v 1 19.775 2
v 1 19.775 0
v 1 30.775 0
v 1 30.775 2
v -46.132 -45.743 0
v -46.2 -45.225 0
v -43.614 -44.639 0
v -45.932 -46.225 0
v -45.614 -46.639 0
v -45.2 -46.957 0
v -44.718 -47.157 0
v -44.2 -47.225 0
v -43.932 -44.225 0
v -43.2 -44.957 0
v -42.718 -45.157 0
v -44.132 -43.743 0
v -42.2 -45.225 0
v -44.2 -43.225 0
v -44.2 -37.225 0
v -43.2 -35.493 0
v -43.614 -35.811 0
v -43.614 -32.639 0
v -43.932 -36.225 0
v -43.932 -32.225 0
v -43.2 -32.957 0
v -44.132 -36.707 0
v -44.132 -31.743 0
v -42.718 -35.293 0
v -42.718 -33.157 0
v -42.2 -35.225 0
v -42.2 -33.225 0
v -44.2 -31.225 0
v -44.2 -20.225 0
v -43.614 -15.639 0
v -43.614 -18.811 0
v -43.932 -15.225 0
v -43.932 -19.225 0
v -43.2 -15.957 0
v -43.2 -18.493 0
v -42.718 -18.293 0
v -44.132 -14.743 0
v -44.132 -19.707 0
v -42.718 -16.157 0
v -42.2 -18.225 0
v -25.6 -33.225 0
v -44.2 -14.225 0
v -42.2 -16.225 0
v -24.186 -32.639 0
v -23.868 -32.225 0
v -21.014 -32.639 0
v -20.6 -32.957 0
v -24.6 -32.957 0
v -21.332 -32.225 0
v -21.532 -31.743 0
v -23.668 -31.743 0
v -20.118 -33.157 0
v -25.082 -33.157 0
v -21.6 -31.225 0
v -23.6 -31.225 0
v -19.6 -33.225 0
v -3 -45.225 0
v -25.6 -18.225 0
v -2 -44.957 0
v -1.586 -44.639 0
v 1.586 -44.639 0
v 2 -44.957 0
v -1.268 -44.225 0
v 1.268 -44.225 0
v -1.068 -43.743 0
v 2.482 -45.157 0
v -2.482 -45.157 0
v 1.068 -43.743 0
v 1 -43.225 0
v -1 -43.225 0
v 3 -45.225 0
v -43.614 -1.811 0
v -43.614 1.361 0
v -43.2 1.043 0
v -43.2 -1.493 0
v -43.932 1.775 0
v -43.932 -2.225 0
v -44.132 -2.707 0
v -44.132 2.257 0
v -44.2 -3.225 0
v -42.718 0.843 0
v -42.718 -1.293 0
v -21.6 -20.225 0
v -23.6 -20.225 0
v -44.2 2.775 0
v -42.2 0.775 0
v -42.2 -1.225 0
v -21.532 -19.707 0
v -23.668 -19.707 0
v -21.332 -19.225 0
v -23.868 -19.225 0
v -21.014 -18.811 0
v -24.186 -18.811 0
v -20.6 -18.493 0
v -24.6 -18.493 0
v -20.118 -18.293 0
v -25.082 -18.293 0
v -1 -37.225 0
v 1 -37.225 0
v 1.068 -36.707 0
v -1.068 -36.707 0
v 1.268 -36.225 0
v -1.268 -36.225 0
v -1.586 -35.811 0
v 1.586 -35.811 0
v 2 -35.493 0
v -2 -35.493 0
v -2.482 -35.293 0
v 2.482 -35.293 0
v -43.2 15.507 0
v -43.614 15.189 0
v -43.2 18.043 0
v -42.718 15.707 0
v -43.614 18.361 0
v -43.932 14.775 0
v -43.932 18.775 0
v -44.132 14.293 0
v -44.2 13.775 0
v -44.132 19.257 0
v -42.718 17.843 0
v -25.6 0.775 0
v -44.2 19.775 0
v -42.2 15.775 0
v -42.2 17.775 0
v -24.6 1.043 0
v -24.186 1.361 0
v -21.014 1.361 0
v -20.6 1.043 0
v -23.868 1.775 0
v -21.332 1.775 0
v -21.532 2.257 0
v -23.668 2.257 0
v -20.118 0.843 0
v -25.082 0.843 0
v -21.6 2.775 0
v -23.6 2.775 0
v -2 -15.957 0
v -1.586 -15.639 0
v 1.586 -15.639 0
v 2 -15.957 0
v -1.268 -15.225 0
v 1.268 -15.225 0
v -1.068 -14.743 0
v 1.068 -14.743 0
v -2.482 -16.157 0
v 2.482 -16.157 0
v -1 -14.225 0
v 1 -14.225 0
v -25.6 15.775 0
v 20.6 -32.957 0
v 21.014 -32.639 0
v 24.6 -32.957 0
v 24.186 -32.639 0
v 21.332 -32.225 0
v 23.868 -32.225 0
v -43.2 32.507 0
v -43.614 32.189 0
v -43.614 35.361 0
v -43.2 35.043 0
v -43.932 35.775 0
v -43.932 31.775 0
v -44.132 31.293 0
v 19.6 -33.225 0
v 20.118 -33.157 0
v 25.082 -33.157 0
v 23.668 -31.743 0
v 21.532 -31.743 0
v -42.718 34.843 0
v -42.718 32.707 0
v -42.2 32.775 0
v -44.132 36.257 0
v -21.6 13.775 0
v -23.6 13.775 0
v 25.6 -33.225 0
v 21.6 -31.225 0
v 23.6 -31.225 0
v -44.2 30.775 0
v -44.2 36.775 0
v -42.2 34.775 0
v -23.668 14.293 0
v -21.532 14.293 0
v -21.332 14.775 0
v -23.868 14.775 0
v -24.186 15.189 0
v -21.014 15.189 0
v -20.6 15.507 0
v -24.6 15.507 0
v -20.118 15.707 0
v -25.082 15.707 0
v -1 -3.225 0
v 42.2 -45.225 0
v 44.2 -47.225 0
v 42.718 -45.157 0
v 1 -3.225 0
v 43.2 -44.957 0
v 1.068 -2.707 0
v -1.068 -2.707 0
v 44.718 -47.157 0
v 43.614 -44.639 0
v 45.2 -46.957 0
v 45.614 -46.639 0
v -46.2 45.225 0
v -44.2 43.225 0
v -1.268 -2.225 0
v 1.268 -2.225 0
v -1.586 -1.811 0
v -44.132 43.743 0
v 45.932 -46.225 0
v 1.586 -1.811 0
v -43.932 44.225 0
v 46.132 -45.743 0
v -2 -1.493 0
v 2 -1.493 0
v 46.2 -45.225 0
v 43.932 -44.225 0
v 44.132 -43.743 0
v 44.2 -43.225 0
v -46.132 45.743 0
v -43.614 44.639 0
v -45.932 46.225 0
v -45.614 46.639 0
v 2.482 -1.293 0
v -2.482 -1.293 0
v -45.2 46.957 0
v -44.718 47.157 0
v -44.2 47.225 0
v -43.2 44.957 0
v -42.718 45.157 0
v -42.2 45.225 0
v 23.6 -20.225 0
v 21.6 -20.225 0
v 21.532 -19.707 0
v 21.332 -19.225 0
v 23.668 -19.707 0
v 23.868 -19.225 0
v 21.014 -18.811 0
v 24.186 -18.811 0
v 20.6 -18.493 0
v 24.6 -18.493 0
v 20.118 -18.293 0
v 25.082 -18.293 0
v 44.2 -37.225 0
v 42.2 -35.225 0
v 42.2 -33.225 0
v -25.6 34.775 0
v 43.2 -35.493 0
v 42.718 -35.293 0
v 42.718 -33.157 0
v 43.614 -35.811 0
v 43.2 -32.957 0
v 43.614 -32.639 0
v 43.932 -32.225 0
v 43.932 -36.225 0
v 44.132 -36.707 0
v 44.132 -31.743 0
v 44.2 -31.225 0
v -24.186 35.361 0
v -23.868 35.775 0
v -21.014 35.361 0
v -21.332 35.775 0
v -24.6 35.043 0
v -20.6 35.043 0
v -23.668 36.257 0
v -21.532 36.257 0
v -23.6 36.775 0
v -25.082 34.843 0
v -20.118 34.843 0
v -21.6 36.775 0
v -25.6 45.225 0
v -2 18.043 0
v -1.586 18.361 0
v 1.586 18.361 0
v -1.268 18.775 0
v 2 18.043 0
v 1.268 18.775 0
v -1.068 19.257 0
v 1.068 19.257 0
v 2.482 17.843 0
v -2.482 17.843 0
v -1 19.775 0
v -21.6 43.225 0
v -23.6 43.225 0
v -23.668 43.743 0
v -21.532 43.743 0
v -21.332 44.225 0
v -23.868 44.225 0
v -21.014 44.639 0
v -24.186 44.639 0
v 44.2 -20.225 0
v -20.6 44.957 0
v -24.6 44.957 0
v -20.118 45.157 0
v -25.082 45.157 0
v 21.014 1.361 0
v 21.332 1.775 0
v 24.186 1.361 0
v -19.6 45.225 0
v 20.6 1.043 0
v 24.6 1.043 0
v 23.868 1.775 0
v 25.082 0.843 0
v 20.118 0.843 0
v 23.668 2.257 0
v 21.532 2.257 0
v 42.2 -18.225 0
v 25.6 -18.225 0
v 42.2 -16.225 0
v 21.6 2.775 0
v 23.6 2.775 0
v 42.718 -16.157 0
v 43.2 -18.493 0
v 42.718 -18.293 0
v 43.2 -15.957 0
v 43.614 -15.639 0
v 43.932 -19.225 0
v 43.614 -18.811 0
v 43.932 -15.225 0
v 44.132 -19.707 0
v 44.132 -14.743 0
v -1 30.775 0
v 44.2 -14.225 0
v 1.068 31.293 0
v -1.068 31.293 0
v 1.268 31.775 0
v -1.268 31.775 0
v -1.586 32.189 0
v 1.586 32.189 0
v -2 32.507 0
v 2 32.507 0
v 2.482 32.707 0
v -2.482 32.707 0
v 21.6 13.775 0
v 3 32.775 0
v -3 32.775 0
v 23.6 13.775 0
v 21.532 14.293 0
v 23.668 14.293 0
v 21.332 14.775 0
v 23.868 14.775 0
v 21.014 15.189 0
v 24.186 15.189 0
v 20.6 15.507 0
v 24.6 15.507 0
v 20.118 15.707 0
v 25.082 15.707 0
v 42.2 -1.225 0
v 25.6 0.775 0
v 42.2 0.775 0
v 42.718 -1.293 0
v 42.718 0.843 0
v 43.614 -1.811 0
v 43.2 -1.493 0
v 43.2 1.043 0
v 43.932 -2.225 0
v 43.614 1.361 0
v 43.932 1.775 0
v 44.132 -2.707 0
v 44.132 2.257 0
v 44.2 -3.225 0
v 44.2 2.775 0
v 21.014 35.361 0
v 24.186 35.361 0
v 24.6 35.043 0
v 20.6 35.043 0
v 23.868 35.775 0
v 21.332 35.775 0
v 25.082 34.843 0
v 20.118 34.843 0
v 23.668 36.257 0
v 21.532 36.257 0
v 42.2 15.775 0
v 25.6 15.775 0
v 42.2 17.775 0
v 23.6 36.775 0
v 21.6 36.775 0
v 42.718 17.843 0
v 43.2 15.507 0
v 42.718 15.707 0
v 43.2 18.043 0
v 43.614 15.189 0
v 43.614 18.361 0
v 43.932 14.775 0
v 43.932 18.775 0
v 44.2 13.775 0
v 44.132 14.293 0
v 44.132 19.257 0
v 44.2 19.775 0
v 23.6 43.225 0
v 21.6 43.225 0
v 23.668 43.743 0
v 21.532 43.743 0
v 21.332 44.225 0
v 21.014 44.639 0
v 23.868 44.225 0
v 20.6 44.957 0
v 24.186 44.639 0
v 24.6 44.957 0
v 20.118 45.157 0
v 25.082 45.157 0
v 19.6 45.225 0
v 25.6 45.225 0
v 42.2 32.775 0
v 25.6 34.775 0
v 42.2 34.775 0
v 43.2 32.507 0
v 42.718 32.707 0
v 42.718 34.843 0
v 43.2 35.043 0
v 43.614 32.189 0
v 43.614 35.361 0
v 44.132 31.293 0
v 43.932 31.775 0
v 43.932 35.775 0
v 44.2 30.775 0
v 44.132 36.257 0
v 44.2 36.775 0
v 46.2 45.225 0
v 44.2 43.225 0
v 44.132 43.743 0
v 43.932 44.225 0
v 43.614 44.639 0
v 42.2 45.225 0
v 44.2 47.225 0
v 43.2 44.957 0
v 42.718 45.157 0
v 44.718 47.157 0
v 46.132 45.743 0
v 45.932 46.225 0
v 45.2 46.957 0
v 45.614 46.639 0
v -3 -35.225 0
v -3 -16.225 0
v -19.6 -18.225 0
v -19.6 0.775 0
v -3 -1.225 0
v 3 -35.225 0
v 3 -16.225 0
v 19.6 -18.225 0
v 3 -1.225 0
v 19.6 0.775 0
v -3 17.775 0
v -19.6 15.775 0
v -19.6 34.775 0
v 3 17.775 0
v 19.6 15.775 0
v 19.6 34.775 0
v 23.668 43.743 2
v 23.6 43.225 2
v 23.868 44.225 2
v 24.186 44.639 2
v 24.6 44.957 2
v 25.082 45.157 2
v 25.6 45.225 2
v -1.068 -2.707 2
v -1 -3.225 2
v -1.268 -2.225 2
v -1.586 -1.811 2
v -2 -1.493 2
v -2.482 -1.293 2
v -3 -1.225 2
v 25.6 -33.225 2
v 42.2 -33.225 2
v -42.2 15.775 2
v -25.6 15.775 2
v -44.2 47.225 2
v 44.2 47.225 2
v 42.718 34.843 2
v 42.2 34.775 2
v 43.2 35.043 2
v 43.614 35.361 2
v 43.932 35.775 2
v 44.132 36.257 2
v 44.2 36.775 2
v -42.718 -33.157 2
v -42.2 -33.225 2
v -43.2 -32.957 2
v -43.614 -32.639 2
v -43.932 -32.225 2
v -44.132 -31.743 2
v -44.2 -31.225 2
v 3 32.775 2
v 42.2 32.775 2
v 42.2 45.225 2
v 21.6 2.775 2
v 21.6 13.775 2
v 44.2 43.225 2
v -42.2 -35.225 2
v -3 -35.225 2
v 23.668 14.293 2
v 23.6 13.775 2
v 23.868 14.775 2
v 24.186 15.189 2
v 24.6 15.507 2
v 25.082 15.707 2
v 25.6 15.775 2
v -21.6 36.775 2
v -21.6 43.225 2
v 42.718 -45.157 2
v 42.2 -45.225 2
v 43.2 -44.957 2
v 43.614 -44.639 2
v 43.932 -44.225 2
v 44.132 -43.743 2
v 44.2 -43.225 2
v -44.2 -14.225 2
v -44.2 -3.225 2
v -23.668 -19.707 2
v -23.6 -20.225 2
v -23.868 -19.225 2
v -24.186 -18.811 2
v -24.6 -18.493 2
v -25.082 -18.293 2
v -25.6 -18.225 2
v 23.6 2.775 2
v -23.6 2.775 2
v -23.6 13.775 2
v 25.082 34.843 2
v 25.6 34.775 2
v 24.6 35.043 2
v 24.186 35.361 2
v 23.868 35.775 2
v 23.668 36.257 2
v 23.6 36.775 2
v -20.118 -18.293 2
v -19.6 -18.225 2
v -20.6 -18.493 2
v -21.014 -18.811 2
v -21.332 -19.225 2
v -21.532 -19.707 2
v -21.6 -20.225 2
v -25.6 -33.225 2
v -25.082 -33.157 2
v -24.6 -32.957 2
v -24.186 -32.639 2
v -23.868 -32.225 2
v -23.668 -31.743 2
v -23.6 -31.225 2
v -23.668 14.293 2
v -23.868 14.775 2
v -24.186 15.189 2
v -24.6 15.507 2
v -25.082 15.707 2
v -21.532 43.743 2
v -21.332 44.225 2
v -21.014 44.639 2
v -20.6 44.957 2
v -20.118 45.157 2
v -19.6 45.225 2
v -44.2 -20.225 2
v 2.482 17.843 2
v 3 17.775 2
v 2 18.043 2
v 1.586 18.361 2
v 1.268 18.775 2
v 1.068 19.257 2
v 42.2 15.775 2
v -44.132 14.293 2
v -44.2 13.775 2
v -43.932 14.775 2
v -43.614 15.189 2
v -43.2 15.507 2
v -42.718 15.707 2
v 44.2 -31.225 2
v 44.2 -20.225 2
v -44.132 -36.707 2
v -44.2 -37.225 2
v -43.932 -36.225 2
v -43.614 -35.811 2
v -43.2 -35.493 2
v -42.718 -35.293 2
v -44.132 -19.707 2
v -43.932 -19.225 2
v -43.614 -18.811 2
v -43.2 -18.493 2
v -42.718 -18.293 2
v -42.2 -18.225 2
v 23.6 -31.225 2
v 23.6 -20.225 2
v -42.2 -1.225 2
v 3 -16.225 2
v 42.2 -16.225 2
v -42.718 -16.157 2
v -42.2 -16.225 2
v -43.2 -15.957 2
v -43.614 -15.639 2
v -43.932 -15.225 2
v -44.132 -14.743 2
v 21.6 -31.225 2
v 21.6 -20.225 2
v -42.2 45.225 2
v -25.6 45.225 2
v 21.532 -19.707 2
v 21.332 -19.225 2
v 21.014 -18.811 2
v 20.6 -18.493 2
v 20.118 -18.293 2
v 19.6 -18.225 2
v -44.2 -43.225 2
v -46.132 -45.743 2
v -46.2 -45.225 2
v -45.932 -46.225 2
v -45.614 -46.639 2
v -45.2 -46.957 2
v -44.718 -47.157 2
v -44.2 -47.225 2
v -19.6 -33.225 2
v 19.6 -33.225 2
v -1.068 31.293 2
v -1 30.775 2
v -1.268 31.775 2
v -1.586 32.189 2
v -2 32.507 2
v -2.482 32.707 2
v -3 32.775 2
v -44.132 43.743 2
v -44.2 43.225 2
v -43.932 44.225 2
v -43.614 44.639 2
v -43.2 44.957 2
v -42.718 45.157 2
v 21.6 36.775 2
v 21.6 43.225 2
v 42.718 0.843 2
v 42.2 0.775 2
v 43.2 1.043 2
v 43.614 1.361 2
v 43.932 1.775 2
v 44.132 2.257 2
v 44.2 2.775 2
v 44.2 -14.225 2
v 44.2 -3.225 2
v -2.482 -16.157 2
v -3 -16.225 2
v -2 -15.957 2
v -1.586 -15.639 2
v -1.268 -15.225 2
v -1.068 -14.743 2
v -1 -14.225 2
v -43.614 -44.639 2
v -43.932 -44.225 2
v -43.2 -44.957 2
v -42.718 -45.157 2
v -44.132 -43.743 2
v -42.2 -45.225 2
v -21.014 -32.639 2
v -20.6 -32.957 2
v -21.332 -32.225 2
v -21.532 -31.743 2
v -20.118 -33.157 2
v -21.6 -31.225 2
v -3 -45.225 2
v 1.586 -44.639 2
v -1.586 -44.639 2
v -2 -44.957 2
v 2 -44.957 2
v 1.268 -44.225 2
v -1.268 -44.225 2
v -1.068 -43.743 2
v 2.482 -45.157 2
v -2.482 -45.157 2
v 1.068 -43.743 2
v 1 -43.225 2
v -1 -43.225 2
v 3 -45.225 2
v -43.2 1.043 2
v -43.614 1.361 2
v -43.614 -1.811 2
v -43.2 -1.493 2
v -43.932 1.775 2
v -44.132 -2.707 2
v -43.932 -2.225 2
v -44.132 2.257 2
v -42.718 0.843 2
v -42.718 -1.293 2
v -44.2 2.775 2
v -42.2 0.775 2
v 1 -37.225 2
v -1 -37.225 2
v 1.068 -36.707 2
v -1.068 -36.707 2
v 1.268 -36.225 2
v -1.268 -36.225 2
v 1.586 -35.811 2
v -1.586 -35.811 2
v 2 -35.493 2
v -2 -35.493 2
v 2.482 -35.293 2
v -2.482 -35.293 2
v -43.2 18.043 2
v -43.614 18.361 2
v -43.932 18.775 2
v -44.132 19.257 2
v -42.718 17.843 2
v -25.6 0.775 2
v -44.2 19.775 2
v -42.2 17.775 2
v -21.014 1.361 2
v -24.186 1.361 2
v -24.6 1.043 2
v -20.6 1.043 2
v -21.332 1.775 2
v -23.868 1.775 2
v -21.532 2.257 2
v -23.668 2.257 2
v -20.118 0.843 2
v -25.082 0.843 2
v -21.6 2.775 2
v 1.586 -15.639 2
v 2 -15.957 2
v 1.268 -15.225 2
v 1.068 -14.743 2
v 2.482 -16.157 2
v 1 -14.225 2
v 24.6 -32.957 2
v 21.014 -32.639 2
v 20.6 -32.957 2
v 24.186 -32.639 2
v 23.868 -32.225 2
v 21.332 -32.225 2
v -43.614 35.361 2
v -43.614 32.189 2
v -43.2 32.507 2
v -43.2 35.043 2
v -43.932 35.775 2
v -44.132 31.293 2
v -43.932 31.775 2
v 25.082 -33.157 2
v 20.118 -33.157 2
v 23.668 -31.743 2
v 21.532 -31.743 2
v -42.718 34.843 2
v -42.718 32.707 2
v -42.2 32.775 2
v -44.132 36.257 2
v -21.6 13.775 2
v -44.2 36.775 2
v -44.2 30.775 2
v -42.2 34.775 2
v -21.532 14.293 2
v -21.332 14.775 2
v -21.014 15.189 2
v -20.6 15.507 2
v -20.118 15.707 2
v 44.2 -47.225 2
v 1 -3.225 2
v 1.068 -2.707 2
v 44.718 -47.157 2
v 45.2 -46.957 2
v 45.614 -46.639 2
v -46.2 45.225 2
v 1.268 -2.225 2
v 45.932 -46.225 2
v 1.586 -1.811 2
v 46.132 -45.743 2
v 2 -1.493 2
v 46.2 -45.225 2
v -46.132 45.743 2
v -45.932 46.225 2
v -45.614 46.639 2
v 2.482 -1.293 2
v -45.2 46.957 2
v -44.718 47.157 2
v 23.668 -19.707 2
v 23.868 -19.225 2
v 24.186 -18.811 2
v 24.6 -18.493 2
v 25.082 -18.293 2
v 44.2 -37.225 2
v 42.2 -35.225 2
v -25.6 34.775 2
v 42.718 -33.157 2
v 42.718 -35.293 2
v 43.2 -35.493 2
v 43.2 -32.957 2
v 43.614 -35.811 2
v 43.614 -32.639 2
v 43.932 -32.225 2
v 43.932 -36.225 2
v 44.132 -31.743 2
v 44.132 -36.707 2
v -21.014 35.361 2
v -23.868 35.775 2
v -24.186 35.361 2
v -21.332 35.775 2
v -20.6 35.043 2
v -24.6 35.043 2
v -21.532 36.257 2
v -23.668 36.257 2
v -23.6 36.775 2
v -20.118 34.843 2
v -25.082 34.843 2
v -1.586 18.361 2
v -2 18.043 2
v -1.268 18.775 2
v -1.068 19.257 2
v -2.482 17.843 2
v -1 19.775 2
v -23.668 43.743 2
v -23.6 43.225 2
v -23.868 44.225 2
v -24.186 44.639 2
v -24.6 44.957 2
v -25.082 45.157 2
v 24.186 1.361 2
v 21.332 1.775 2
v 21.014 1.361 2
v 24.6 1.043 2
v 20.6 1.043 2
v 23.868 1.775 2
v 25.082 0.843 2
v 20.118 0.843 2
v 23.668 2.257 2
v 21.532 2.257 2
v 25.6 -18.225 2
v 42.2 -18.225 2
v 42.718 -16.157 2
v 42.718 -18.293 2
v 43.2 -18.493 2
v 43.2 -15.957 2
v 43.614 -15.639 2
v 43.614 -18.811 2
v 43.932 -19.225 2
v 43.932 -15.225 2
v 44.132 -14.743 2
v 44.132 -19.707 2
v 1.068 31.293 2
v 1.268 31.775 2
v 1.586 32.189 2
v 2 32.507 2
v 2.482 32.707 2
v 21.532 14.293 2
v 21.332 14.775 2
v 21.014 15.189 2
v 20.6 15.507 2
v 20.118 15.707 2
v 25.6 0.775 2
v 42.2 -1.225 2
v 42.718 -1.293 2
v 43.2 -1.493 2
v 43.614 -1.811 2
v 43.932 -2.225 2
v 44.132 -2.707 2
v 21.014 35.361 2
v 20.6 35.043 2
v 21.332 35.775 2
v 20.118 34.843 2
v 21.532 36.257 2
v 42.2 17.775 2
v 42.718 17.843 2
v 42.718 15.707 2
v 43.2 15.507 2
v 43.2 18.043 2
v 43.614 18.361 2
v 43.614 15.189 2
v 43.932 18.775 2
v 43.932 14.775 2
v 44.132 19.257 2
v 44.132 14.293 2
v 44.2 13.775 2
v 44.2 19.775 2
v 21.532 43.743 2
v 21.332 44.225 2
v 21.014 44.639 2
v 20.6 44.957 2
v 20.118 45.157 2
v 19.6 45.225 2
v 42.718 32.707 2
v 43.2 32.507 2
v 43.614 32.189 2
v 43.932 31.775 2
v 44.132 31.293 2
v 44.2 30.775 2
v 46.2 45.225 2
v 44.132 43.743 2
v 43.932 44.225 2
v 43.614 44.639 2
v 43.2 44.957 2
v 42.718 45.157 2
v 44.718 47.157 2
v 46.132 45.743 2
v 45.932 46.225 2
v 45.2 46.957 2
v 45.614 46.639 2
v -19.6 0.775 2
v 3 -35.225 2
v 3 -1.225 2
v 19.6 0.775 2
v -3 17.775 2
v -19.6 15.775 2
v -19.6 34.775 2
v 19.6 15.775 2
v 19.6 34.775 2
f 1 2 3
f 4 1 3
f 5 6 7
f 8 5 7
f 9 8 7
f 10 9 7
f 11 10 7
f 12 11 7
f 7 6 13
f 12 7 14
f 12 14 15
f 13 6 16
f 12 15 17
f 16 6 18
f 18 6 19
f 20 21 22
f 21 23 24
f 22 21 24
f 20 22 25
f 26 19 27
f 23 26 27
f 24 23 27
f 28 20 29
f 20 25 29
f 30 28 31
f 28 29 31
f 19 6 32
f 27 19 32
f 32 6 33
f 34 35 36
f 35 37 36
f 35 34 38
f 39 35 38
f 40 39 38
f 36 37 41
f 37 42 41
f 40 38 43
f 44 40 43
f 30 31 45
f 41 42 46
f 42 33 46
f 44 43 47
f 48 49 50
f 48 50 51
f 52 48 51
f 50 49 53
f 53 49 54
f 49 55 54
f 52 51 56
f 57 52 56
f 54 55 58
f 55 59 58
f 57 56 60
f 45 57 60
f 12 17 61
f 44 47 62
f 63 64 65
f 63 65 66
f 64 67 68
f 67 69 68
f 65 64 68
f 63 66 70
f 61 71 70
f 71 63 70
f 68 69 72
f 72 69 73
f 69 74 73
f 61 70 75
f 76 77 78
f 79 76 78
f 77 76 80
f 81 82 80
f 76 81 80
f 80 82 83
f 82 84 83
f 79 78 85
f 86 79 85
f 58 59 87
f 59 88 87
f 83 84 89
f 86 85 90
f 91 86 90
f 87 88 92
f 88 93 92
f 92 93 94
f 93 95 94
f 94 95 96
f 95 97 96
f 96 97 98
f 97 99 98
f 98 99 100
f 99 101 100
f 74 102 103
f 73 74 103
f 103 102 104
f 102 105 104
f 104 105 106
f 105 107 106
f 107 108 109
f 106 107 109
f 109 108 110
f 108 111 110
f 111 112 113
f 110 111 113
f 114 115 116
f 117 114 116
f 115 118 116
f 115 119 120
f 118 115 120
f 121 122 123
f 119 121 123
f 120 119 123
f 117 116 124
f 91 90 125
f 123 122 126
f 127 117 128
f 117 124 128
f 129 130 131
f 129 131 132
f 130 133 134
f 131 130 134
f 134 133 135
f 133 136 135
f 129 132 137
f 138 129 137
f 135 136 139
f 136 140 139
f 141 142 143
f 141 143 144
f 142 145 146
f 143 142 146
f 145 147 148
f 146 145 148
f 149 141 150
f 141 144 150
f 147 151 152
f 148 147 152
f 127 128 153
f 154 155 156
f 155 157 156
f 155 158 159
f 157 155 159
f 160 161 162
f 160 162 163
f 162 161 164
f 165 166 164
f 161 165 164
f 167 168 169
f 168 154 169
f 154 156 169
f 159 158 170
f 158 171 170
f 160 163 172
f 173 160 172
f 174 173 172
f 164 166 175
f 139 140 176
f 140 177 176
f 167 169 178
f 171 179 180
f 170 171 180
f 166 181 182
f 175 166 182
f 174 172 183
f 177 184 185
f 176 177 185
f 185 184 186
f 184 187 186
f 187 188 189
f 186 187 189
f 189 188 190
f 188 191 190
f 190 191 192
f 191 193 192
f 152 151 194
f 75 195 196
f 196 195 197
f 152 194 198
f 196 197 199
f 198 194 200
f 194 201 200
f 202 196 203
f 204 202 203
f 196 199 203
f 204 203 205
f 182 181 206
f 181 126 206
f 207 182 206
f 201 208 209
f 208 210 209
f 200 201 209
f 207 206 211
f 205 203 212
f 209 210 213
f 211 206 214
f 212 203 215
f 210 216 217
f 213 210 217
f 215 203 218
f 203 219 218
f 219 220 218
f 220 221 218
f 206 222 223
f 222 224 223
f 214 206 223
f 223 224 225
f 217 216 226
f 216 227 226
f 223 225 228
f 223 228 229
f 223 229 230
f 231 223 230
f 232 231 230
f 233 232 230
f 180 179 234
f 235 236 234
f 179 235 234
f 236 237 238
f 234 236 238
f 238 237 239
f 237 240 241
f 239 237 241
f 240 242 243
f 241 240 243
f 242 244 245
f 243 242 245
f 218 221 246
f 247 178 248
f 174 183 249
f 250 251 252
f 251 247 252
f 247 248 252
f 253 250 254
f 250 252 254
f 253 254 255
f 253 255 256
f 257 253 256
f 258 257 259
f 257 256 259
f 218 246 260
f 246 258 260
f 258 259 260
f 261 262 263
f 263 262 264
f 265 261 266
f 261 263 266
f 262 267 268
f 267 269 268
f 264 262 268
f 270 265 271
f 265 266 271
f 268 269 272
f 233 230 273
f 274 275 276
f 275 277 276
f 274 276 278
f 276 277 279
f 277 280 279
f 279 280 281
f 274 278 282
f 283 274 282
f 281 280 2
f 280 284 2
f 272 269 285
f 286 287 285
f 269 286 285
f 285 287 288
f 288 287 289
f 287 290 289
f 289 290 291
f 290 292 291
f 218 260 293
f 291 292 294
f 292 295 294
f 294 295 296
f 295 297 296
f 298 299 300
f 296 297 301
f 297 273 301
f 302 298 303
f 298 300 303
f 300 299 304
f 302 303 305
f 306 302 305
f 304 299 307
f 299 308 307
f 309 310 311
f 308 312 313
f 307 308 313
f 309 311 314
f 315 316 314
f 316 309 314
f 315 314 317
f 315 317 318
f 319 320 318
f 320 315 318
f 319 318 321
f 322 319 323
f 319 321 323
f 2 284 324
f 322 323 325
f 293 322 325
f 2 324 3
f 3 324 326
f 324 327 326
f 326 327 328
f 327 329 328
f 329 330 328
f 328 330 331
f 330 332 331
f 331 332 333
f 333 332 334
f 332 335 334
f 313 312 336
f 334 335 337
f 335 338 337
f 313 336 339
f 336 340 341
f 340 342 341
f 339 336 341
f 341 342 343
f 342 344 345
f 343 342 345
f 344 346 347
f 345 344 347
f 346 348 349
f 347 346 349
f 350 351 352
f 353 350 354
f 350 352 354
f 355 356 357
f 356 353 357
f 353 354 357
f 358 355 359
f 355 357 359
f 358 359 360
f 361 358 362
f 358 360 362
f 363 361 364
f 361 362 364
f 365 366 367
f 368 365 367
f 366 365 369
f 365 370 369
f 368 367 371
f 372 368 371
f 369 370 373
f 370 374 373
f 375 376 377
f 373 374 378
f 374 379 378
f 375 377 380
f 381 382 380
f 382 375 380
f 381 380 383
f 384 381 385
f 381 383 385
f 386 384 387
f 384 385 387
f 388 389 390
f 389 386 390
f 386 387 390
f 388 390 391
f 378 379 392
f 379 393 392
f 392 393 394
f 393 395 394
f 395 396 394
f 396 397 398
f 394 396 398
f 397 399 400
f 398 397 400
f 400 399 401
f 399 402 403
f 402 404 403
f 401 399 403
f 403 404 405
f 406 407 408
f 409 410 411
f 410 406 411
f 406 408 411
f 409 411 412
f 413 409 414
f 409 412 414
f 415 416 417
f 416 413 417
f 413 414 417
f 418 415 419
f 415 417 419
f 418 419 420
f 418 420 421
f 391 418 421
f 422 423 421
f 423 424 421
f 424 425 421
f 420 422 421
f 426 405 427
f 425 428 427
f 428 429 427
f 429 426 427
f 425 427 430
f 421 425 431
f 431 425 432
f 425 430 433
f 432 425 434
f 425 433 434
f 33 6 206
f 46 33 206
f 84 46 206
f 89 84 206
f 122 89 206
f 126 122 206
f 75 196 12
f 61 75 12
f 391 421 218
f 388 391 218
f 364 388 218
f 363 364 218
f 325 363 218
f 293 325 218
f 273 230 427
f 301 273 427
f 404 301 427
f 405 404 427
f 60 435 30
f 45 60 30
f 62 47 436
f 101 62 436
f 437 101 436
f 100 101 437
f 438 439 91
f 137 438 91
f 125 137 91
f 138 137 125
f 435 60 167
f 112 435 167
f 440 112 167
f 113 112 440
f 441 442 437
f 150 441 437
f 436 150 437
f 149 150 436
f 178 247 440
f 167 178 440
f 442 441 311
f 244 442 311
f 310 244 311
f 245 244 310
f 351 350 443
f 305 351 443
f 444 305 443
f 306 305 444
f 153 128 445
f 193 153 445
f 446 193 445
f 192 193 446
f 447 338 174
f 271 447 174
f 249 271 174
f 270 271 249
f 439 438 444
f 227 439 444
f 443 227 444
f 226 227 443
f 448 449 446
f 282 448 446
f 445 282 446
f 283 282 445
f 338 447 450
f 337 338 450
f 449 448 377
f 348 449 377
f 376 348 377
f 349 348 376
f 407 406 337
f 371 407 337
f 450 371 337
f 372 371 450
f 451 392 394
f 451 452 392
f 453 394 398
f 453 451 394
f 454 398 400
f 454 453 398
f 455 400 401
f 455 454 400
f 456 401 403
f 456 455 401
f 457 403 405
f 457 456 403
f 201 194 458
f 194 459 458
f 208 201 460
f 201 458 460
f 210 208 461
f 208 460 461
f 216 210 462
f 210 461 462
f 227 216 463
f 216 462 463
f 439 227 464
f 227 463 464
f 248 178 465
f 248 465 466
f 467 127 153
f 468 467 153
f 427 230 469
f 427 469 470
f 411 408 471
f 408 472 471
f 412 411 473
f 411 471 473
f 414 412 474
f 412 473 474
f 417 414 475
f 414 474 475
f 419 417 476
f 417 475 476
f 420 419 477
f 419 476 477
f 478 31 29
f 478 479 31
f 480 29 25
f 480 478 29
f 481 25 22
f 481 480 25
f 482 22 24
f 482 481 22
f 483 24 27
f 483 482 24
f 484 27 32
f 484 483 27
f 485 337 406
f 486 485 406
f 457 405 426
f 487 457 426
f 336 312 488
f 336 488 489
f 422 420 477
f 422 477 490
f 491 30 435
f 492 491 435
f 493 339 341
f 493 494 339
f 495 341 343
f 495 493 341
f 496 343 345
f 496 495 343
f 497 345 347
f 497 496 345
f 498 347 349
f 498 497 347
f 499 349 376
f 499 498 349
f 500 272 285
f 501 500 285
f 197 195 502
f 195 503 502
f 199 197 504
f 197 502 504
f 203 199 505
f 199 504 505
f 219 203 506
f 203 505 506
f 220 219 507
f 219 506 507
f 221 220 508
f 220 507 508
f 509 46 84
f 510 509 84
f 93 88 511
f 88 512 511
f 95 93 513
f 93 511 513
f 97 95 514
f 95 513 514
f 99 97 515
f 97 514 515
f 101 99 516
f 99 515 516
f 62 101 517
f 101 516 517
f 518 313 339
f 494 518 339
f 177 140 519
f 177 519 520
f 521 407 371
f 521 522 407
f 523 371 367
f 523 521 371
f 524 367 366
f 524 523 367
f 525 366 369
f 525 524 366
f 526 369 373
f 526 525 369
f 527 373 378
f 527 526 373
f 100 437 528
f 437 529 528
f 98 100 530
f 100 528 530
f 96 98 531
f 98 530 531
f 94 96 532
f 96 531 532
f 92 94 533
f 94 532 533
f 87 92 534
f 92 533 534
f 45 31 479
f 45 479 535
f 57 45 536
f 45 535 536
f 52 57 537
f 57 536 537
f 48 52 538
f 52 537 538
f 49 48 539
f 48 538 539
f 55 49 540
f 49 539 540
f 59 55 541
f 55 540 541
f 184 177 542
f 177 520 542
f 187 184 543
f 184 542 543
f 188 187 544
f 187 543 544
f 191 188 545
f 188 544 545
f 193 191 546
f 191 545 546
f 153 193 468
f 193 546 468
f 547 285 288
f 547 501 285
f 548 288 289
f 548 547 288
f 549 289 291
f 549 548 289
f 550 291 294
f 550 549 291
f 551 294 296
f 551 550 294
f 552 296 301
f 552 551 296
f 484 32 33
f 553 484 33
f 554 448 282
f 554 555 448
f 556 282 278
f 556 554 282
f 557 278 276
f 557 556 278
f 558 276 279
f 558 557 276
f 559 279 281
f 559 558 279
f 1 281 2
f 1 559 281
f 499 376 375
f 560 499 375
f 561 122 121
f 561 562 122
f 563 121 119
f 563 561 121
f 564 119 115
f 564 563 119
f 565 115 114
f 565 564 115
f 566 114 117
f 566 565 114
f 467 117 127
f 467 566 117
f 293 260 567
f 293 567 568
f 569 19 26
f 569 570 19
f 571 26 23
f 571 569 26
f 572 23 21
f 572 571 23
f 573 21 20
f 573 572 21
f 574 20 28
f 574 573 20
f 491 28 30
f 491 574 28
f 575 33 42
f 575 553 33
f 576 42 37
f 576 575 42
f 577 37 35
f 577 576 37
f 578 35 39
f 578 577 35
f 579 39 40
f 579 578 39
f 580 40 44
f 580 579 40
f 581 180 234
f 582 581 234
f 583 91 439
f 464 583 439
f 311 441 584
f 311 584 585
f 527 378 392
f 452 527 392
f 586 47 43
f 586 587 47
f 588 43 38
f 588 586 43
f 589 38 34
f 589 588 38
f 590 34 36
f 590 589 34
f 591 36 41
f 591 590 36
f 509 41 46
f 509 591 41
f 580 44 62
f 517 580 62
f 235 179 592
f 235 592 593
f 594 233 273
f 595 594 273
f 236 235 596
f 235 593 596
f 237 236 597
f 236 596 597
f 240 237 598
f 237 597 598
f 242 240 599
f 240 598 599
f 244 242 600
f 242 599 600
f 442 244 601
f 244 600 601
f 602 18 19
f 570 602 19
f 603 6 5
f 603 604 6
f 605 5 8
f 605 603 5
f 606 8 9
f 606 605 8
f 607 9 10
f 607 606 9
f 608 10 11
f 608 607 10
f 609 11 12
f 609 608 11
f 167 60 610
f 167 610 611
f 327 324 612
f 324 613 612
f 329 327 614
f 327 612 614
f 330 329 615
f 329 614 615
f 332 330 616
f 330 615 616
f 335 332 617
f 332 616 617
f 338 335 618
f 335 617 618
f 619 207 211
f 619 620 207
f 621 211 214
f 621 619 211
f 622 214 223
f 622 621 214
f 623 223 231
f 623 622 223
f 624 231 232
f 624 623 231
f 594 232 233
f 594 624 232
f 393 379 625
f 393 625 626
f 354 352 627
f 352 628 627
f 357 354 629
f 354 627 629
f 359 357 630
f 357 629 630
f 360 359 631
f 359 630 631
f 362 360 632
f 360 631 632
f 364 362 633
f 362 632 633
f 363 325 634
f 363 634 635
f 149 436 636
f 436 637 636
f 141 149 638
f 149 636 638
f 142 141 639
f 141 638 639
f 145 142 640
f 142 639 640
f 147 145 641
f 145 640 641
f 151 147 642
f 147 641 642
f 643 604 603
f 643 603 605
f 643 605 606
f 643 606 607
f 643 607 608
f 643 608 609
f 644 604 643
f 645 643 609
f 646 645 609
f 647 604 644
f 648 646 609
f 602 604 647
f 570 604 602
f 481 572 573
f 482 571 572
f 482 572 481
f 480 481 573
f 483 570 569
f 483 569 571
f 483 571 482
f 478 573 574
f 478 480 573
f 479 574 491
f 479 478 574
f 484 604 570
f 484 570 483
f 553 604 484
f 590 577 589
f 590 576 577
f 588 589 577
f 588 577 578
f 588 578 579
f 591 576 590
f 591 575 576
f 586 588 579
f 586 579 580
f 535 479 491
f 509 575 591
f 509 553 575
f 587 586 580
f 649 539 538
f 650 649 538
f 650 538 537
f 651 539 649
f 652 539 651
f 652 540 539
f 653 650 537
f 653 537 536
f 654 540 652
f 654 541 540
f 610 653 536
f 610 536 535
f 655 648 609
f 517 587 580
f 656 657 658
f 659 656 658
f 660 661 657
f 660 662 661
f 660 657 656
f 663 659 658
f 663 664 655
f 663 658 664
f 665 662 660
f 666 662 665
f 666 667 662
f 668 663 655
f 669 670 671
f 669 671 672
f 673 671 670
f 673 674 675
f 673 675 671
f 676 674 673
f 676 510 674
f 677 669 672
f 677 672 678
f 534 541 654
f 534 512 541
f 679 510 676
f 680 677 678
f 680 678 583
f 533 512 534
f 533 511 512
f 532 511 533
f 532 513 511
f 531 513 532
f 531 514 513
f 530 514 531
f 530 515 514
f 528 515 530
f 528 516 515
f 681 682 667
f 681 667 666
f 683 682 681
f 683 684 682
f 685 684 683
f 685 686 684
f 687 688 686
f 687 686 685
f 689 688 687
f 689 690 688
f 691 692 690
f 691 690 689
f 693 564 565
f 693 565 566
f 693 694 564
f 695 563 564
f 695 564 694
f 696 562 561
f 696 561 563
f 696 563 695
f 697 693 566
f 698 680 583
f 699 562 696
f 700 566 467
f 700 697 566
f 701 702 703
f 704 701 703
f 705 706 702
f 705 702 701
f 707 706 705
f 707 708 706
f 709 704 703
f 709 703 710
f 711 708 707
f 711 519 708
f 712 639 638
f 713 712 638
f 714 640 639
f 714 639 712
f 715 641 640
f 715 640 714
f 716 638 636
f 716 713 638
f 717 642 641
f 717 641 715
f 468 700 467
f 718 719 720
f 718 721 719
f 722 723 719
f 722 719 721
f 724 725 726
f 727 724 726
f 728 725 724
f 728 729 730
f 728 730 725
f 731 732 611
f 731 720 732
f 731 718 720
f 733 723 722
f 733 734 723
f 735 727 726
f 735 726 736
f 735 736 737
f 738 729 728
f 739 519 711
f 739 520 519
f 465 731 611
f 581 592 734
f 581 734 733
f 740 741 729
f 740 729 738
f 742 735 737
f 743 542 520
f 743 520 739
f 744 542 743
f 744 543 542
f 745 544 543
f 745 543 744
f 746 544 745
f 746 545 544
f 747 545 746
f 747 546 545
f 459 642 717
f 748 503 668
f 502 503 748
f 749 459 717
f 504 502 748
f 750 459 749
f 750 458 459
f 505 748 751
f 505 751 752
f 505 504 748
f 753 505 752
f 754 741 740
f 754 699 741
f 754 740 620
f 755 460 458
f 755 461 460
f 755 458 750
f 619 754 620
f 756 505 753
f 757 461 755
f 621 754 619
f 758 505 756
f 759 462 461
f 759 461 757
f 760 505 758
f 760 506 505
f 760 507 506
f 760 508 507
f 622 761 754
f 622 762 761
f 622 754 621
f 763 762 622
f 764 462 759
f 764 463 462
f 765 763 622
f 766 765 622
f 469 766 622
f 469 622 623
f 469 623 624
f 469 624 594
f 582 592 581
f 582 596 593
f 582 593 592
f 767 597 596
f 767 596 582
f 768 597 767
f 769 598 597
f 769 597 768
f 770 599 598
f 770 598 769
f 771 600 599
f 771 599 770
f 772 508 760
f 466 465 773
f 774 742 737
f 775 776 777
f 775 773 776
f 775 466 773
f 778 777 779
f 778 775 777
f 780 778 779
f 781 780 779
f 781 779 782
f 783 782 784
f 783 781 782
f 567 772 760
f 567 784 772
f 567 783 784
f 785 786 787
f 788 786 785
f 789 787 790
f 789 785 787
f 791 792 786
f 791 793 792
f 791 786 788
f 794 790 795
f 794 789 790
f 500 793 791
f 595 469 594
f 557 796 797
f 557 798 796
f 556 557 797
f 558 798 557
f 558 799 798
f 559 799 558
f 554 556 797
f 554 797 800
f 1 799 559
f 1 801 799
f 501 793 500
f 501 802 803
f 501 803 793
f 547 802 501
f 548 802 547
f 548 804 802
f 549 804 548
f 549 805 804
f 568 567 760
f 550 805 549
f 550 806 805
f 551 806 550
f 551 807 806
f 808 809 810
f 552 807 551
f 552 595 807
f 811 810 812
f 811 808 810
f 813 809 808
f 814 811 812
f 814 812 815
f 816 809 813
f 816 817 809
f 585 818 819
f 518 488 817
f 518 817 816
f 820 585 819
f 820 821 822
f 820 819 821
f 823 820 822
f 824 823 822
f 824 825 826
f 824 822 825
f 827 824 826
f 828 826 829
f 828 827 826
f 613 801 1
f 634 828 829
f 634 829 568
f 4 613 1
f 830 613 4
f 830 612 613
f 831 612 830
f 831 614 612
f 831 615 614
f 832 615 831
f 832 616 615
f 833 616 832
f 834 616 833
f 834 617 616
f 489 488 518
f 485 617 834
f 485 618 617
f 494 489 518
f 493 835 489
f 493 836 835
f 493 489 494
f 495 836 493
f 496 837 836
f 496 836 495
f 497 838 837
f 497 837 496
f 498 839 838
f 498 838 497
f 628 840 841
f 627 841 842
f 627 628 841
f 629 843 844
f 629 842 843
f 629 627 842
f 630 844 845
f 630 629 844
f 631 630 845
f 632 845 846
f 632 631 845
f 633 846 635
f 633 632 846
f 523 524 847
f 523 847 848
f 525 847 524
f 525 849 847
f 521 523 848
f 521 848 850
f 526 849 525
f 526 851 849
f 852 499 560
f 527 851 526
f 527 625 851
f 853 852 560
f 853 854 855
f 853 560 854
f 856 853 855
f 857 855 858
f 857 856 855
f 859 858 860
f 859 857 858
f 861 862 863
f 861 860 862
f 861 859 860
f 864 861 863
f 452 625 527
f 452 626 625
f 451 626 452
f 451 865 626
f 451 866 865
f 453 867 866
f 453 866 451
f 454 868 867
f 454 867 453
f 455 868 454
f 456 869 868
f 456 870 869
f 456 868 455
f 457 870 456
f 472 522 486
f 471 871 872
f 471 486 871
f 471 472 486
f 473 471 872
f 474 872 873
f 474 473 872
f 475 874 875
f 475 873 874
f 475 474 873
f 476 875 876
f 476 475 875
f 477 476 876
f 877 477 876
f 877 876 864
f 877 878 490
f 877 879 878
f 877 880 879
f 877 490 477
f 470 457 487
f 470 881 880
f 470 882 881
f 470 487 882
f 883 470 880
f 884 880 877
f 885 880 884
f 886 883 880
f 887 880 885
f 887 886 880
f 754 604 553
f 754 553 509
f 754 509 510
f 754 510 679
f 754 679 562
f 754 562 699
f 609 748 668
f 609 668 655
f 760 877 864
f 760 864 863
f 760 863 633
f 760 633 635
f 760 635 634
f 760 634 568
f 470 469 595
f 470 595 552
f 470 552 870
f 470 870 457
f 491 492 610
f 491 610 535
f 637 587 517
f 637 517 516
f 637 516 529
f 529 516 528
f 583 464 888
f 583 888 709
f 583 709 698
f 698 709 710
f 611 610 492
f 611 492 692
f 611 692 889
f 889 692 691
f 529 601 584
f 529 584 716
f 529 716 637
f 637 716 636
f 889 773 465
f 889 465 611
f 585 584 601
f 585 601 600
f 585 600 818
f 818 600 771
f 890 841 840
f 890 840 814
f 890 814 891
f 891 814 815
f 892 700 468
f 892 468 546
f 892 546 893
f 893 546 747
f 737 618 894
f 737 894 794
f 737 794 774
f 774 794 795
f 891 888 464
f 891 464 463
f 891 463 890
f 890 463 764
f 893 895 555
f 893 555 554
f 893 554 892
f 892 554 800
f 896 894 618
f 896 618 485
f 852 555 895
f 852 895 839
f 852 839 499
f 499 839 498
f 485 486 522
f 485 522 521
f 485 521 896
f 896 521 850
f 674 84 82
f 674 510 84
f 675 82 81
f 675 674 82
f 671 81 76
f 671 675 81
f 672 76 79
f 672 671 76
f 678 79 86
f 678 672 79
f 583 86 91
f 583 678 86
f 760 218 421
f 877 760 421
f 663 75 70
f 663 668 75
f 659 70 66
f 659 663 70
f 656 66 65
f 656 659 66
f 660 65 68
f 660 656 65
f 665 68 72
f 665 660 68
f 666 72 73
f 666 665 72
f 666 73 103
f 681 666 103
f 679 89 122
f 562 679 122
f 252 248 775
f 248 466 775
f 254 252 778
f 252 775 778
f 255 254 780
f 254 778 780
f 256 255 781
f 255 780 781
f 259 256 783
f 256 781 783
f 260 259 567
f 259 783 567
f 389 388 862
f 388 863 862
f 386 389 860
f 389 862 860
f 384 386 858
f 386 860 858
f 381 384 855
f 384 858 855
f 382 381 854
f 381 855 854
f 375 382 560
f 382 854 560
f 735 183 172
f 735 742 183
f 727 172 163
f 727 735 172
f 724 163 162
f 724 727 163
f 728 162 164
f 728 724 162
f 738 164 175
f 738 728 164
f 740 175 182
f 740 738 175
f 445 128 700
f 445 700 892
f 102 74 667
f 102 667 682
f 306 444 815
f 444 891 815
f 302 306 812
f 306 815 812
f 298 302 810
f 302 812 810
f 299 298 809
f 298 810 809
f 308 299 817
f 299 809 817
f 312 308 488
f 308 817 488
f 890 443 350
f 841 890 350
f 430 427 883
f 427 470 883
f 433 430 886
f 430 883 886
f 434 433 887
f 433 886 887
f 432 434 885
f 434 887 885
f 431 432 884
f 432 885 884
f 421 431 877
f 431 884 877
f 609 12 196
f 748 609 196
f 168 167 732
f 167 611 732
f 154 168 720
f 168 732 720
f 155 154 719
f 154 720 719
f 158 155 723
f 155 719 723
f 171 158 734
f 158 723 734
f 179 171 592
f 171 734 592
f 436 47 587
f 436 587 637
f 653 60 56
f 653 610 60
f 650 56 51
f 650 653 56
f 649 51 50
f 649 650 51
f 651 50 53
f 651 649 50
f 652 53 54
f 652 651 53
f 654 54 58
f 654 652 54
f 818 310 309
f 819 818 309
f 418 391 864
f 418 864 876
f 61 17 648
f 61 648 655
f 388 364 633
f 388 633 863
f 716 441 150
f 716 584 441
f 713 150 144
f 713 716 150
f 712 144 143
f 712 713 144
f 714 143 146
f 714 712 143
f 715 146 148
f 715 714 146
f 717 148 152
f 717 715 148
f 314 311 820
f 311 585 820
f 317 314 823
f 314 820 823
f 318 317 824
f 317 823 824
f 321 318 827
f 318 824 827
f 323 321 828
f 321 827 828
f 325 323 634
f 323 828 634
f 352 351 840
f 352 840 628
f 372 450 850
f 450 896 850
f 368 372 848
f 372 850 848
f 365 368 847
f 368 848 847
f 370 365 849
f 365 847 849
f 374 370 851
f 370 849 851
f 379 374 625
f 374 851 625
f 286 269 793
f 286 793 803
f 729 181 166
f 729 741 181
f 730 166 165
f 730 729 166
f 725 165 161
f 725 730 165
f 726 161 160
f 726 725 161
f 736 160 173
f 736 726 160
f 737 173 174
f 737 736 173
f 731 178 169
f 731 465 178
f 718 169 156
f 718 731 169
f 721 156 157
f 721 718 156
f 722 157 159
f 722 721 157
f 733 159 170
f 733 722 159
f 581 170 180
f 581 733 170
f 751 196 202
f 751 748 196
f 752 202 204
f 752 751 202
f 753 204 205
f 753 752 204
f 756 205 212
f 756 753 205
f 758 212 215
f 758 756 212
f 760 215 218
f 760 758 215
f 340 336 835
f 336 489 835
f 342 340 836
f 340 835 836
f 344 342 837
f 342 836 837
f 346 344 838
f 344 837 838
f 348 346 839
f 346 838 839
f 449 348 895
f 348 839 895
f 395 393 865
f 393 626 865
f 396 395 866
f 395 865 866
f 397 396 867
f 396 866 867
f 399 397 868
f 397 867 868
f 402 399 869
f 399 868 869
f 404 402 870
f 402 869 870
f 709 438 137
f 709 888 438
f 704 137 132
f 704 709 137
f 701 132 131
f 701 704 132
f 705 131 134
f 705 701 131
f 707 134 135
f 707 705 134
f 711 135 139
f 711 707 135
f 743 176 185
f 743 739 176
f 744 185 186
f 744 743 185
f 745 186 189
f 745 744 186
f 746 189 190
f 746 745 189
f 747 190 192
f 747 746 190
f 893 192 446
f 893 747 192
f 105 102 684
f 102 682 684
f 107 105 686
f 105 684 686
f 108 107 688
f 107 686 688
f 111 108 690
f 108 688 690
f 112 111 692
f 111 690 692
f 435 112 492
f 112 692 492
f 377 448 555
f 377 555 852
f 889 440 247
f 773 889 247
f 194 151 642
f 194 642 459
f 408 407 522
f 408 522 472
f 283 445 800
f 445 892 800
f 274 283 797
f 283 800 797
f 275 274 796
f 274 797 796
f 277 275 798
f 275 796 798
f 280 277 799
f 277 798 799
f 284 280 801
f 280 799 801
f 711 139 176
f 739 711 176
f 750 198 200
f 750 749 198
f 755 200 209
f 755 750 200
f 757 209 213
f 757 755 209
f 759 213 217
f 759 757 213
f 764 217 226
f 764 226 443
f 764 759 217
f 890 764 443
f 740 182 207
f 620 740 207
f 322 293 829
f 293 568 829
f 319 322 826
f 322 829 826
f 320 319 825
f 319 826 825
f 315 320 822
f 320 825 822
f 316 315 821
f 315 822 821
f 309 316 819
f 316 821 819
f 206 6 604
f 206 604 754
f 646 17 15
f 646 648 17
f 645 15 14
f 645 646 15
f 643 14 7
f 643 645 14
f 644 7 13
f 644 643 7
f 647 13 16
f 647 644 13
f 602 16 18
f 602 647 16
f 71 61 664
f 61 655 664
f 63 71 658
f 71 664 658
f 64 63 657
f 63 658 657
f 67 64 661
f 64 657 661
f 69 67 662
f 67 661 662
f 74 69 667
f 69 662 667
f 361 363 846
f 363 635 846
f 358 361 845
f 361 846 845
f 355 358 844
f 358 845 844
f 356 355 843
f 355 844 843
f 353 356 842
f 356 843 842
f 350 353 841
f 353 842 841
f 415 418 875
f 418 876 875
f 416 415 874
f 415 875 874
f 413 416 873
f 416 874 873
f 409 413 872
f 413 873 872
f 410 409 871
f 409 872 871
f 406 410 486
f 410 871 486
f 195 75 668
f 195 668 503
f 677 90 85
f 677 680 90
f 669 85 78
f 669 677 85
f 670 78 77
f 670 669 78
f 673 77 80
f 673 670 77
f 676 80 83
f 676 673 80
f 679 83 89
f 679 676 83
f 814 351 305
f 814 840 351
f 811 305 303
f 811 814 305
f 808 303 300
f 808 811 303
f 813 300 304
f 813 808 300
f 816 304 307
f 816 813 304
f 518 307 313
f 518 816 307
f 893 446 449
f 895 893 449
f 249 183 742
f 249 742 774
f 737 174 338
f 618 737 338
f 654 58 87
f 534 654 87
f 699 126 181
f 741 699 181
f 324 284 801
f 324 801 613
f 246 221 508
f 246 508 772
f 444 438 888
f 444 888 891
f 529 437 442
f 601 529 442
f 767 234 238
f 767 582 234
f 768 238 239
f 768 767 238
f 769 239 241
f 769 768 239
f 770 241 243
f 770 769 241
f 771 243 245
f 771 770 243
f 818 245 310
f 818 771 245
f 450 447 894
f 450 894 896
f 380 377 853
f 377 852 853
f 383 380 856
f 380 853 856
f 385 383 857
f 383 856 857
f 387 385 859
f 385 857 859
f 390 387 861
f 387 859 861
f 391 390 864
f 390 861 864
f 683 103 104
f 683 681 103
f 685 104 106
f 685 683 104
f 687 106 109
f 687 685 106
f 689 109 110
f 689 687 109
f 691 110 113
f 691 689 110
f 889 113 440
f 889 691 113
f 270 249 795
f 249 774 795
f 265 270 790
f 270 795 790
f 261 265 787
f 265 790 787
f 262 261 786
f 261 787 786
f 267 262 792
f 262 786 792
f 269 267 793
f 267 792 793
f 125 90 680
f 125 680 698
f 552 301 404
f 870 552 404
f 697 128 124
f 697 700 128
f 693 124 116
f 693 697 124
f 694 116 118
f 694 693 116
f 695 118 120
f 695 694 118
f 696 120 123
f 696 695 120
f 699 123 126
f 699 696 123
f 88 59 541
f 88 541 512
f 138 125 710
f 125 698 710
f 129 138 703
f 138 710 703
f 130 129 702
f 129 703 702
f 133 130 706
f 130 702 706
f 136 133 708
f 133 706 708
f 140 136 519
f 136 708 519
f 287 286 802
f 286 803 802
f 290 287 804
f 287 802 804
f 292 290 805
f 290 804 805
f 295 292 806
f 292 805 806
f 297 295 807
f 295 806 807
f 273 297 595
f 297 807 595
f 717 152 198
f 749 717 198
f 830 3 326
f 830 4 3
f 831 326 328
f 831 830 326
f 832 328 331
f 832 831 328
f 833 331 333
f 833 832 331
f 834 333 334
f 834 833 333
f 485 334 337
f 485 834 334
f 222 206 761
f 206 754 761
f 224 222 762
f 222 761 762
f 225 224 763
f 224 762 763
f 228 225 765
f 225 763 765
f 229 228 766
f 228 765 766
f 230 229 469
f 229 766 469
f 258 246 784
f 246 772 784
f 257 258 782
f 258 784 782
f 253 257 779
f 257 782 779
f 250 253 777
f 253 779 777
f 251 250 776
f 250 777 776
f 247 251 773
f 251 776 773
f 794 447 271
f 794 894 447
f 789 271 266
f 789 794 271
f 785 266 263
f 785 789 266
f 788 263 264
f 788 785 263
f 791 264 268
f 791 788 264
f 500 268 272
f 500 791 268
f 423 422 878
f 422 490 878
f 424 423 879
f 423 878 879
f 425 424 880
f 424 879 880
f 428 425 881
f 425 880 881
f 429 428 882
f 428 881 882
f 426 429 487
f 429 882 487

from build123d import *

# Parameters (mm, degrees)
IZIM1_W                     = 92.4
IZIM1_H                     = 94.45
IZIM1_W_2                   = 20.6
IZIM1_H_2                   = 10.45
IZIM1_W_3                   = 43.2
IZIM1_H_3                   = 10
IZIM1_H_4                   = 15
Y_KSEKLIK_EKSTR_ZYON1_DEPTH = 2
RADYUS1_R                   = 2


with BuildPart() as part:
    # Çizim1 → Yükseklik-Ekstrüzyon1 (new body)
    with BuildSketch(Plane.XY):
        Rectangle(IZIM1_W, IZIM1_H)
        with Locations((-33.9, 40)):
            Rectangle(IZIM1_W_2, IZIM1_H_2, mode=Mode.SUBTRACT)
        with Locations((-22.6, -40.225)):
            Rectangle(IZIM1_W_3, IZIM1_H_3, mode=Mode.SUBTRACT)
        with Locations((22.6, -40.225)):
            Rectangle(IZIM1_W_3, IZIM1_H_3, mode=Mode.SUBTRACT)
        with Locations((-33.9, -25.725)):
            Rectangle(IZIM1_W_2, IZIM1_H_4, mode=Mode.SUBTRACT)
        with Locations((-22.6, -8.725)):
            Rectangle(IZIM1_W_3, IZIM1_H_4, mode=Mode.SUBTRACT)
        with Locations((-33.9, 8.275)):
            Rectangle(IZIM1_W_2, IZIM1_H_4, mode=Mode.SUBTRACT)
        with Locations((-22.6, 25.275)):
            Rectangle(IZIM1_W_3, IZIM1_H_4, mode=Mode.SUBTRACT)
        with Locations((33.9, -25.725)):
            Rectangle(IZIM1_W_2, IZIM1_H_4, mode=Mode.SUBTRACT)
        with Locations((22.6, -8.725)):
            Rectangle(IZIM1_W_3, IZIM1_H_4, mode=Mode.SUBTRACT)
        with Locations((33.9, 8.275)):
            Rectangle(IZIM1_W_2, IZIM1_H_4, mode=Mode.SUBTRACT)
        with Locations((22.6, 25.275)):
            Rectangle(IZIM1_W_3, IZIM1_H_4, mode=Mode.SUBTRACT)
        with Locations((33.9, 40)):
            Rectangle(IZIM1_W_2, IZIM1_H_2, mode=Mode.SUBTRACT)
        with Locations((0, 40)):
            Rectangle(IZIM1_W_3, IZIM1_H_2, mode=Mode.SUBTRACT)
        with Locations((0, 8.275)):
            Rectangle(IZIM1_W_3, IZIM1_H_4, mode=Mode.SUBTRACT)
        with Locations((0, -25.725)):
            Rectangle(IZIM1_W_3, IZIM1_H_4, mode=Mode.SUBTRACT)
    extrude(amount=Y_KSEKLIK_EKSTR_ZYON1_DEPTH)

    # Radyus1
    radyus1_edges = [part.edges().sort_by_distance(p)[0] for p in [
        (1, -16.225, 1),
        (44.2, -16.225, 1),
        (44.2, -1.225, 1),
        (1, -1.225, 1),
        (-44.2, 15.775, 1),
        (-44.2, 0.775, 1),
        (-23.6, 0.775, 1),
        (-23.6, 15.775, 1),
        (23.6, 0.775, 1),
        (44.2, 0.775, 1),
        (44.2, 15.775, 1),
        (23.6, 15.775, 1),
        (-44.2, 32.775, 1),
        (-44.2, 17.775, 1),
        (-1, 17.775, 1),
        (-1, 32.775, 1),
        (44.2, 45.225, 1),
        (1, 17.775, 1),
        (44.2, 17.775, 1),
        (44.2, 32.775, 1),
        (1, 32.775, 1),
        (23.6, 45.225, 1),
        (23.6, 34.775, 1),
        (44.2, 34.775, 1),
        (-21.6, 34.775, 1),
        (21.6, 34.775, 1),
        (21.6, 45.225, 1),
        (-21.6, 45.225, 1),
        (-21.6, 0.775, 1),
        (21.6, 0.775, 1),
        (21.6, 15.775, 1),
        (-21.6, 15.775, 1),
        (21.6, -18.225, 1),
        (-21.6, -18.225, 1),
        (-21.6, -33.225, 1),
        (21.6, -33.225, 1),
        (-44.2, -35.225, 1),
        (-44.2, -45.225, 1),
        (-1, -45.225, 1),
        (-1, -35.225, 1),
        (-23.6, 45.225, 1),
        (-44.2, 45.225, 1),
        (-44.2, 34.775, 1),
        (-23.6, 34.775, 1),
        (1, -45.225, 1),
        (44.2, -45.225, 1),
        (44.2, -35.225, 1),
        (1, -35.225, 1),
        (-44.2, -18.225, 1),
        (-44.2, -33.225, 1),
        (-23.6, -33.225, 1),
        (-23.6, -18.225, 1),
        (46.2, -47.225, 1),
        (-46.2, -47.225, 1),
        (23.6, -33.225, 1),
        (-46.2, 47.225, 1),
        (44.2, -33.225, 1),
        (44.2, -18.225, 1),
        (23.6, -18.225, 1),
        (46.2, 47.225, 1),
        (-44.2, -1.225, 1),
        (-44.2, -16.225, 1),
        (-1, -16.225, 1),
        (-1, -1.225, 1),
    ]]
    fillet(radyus1_edges, radius=RADYUS1_R)


solid = part.part
